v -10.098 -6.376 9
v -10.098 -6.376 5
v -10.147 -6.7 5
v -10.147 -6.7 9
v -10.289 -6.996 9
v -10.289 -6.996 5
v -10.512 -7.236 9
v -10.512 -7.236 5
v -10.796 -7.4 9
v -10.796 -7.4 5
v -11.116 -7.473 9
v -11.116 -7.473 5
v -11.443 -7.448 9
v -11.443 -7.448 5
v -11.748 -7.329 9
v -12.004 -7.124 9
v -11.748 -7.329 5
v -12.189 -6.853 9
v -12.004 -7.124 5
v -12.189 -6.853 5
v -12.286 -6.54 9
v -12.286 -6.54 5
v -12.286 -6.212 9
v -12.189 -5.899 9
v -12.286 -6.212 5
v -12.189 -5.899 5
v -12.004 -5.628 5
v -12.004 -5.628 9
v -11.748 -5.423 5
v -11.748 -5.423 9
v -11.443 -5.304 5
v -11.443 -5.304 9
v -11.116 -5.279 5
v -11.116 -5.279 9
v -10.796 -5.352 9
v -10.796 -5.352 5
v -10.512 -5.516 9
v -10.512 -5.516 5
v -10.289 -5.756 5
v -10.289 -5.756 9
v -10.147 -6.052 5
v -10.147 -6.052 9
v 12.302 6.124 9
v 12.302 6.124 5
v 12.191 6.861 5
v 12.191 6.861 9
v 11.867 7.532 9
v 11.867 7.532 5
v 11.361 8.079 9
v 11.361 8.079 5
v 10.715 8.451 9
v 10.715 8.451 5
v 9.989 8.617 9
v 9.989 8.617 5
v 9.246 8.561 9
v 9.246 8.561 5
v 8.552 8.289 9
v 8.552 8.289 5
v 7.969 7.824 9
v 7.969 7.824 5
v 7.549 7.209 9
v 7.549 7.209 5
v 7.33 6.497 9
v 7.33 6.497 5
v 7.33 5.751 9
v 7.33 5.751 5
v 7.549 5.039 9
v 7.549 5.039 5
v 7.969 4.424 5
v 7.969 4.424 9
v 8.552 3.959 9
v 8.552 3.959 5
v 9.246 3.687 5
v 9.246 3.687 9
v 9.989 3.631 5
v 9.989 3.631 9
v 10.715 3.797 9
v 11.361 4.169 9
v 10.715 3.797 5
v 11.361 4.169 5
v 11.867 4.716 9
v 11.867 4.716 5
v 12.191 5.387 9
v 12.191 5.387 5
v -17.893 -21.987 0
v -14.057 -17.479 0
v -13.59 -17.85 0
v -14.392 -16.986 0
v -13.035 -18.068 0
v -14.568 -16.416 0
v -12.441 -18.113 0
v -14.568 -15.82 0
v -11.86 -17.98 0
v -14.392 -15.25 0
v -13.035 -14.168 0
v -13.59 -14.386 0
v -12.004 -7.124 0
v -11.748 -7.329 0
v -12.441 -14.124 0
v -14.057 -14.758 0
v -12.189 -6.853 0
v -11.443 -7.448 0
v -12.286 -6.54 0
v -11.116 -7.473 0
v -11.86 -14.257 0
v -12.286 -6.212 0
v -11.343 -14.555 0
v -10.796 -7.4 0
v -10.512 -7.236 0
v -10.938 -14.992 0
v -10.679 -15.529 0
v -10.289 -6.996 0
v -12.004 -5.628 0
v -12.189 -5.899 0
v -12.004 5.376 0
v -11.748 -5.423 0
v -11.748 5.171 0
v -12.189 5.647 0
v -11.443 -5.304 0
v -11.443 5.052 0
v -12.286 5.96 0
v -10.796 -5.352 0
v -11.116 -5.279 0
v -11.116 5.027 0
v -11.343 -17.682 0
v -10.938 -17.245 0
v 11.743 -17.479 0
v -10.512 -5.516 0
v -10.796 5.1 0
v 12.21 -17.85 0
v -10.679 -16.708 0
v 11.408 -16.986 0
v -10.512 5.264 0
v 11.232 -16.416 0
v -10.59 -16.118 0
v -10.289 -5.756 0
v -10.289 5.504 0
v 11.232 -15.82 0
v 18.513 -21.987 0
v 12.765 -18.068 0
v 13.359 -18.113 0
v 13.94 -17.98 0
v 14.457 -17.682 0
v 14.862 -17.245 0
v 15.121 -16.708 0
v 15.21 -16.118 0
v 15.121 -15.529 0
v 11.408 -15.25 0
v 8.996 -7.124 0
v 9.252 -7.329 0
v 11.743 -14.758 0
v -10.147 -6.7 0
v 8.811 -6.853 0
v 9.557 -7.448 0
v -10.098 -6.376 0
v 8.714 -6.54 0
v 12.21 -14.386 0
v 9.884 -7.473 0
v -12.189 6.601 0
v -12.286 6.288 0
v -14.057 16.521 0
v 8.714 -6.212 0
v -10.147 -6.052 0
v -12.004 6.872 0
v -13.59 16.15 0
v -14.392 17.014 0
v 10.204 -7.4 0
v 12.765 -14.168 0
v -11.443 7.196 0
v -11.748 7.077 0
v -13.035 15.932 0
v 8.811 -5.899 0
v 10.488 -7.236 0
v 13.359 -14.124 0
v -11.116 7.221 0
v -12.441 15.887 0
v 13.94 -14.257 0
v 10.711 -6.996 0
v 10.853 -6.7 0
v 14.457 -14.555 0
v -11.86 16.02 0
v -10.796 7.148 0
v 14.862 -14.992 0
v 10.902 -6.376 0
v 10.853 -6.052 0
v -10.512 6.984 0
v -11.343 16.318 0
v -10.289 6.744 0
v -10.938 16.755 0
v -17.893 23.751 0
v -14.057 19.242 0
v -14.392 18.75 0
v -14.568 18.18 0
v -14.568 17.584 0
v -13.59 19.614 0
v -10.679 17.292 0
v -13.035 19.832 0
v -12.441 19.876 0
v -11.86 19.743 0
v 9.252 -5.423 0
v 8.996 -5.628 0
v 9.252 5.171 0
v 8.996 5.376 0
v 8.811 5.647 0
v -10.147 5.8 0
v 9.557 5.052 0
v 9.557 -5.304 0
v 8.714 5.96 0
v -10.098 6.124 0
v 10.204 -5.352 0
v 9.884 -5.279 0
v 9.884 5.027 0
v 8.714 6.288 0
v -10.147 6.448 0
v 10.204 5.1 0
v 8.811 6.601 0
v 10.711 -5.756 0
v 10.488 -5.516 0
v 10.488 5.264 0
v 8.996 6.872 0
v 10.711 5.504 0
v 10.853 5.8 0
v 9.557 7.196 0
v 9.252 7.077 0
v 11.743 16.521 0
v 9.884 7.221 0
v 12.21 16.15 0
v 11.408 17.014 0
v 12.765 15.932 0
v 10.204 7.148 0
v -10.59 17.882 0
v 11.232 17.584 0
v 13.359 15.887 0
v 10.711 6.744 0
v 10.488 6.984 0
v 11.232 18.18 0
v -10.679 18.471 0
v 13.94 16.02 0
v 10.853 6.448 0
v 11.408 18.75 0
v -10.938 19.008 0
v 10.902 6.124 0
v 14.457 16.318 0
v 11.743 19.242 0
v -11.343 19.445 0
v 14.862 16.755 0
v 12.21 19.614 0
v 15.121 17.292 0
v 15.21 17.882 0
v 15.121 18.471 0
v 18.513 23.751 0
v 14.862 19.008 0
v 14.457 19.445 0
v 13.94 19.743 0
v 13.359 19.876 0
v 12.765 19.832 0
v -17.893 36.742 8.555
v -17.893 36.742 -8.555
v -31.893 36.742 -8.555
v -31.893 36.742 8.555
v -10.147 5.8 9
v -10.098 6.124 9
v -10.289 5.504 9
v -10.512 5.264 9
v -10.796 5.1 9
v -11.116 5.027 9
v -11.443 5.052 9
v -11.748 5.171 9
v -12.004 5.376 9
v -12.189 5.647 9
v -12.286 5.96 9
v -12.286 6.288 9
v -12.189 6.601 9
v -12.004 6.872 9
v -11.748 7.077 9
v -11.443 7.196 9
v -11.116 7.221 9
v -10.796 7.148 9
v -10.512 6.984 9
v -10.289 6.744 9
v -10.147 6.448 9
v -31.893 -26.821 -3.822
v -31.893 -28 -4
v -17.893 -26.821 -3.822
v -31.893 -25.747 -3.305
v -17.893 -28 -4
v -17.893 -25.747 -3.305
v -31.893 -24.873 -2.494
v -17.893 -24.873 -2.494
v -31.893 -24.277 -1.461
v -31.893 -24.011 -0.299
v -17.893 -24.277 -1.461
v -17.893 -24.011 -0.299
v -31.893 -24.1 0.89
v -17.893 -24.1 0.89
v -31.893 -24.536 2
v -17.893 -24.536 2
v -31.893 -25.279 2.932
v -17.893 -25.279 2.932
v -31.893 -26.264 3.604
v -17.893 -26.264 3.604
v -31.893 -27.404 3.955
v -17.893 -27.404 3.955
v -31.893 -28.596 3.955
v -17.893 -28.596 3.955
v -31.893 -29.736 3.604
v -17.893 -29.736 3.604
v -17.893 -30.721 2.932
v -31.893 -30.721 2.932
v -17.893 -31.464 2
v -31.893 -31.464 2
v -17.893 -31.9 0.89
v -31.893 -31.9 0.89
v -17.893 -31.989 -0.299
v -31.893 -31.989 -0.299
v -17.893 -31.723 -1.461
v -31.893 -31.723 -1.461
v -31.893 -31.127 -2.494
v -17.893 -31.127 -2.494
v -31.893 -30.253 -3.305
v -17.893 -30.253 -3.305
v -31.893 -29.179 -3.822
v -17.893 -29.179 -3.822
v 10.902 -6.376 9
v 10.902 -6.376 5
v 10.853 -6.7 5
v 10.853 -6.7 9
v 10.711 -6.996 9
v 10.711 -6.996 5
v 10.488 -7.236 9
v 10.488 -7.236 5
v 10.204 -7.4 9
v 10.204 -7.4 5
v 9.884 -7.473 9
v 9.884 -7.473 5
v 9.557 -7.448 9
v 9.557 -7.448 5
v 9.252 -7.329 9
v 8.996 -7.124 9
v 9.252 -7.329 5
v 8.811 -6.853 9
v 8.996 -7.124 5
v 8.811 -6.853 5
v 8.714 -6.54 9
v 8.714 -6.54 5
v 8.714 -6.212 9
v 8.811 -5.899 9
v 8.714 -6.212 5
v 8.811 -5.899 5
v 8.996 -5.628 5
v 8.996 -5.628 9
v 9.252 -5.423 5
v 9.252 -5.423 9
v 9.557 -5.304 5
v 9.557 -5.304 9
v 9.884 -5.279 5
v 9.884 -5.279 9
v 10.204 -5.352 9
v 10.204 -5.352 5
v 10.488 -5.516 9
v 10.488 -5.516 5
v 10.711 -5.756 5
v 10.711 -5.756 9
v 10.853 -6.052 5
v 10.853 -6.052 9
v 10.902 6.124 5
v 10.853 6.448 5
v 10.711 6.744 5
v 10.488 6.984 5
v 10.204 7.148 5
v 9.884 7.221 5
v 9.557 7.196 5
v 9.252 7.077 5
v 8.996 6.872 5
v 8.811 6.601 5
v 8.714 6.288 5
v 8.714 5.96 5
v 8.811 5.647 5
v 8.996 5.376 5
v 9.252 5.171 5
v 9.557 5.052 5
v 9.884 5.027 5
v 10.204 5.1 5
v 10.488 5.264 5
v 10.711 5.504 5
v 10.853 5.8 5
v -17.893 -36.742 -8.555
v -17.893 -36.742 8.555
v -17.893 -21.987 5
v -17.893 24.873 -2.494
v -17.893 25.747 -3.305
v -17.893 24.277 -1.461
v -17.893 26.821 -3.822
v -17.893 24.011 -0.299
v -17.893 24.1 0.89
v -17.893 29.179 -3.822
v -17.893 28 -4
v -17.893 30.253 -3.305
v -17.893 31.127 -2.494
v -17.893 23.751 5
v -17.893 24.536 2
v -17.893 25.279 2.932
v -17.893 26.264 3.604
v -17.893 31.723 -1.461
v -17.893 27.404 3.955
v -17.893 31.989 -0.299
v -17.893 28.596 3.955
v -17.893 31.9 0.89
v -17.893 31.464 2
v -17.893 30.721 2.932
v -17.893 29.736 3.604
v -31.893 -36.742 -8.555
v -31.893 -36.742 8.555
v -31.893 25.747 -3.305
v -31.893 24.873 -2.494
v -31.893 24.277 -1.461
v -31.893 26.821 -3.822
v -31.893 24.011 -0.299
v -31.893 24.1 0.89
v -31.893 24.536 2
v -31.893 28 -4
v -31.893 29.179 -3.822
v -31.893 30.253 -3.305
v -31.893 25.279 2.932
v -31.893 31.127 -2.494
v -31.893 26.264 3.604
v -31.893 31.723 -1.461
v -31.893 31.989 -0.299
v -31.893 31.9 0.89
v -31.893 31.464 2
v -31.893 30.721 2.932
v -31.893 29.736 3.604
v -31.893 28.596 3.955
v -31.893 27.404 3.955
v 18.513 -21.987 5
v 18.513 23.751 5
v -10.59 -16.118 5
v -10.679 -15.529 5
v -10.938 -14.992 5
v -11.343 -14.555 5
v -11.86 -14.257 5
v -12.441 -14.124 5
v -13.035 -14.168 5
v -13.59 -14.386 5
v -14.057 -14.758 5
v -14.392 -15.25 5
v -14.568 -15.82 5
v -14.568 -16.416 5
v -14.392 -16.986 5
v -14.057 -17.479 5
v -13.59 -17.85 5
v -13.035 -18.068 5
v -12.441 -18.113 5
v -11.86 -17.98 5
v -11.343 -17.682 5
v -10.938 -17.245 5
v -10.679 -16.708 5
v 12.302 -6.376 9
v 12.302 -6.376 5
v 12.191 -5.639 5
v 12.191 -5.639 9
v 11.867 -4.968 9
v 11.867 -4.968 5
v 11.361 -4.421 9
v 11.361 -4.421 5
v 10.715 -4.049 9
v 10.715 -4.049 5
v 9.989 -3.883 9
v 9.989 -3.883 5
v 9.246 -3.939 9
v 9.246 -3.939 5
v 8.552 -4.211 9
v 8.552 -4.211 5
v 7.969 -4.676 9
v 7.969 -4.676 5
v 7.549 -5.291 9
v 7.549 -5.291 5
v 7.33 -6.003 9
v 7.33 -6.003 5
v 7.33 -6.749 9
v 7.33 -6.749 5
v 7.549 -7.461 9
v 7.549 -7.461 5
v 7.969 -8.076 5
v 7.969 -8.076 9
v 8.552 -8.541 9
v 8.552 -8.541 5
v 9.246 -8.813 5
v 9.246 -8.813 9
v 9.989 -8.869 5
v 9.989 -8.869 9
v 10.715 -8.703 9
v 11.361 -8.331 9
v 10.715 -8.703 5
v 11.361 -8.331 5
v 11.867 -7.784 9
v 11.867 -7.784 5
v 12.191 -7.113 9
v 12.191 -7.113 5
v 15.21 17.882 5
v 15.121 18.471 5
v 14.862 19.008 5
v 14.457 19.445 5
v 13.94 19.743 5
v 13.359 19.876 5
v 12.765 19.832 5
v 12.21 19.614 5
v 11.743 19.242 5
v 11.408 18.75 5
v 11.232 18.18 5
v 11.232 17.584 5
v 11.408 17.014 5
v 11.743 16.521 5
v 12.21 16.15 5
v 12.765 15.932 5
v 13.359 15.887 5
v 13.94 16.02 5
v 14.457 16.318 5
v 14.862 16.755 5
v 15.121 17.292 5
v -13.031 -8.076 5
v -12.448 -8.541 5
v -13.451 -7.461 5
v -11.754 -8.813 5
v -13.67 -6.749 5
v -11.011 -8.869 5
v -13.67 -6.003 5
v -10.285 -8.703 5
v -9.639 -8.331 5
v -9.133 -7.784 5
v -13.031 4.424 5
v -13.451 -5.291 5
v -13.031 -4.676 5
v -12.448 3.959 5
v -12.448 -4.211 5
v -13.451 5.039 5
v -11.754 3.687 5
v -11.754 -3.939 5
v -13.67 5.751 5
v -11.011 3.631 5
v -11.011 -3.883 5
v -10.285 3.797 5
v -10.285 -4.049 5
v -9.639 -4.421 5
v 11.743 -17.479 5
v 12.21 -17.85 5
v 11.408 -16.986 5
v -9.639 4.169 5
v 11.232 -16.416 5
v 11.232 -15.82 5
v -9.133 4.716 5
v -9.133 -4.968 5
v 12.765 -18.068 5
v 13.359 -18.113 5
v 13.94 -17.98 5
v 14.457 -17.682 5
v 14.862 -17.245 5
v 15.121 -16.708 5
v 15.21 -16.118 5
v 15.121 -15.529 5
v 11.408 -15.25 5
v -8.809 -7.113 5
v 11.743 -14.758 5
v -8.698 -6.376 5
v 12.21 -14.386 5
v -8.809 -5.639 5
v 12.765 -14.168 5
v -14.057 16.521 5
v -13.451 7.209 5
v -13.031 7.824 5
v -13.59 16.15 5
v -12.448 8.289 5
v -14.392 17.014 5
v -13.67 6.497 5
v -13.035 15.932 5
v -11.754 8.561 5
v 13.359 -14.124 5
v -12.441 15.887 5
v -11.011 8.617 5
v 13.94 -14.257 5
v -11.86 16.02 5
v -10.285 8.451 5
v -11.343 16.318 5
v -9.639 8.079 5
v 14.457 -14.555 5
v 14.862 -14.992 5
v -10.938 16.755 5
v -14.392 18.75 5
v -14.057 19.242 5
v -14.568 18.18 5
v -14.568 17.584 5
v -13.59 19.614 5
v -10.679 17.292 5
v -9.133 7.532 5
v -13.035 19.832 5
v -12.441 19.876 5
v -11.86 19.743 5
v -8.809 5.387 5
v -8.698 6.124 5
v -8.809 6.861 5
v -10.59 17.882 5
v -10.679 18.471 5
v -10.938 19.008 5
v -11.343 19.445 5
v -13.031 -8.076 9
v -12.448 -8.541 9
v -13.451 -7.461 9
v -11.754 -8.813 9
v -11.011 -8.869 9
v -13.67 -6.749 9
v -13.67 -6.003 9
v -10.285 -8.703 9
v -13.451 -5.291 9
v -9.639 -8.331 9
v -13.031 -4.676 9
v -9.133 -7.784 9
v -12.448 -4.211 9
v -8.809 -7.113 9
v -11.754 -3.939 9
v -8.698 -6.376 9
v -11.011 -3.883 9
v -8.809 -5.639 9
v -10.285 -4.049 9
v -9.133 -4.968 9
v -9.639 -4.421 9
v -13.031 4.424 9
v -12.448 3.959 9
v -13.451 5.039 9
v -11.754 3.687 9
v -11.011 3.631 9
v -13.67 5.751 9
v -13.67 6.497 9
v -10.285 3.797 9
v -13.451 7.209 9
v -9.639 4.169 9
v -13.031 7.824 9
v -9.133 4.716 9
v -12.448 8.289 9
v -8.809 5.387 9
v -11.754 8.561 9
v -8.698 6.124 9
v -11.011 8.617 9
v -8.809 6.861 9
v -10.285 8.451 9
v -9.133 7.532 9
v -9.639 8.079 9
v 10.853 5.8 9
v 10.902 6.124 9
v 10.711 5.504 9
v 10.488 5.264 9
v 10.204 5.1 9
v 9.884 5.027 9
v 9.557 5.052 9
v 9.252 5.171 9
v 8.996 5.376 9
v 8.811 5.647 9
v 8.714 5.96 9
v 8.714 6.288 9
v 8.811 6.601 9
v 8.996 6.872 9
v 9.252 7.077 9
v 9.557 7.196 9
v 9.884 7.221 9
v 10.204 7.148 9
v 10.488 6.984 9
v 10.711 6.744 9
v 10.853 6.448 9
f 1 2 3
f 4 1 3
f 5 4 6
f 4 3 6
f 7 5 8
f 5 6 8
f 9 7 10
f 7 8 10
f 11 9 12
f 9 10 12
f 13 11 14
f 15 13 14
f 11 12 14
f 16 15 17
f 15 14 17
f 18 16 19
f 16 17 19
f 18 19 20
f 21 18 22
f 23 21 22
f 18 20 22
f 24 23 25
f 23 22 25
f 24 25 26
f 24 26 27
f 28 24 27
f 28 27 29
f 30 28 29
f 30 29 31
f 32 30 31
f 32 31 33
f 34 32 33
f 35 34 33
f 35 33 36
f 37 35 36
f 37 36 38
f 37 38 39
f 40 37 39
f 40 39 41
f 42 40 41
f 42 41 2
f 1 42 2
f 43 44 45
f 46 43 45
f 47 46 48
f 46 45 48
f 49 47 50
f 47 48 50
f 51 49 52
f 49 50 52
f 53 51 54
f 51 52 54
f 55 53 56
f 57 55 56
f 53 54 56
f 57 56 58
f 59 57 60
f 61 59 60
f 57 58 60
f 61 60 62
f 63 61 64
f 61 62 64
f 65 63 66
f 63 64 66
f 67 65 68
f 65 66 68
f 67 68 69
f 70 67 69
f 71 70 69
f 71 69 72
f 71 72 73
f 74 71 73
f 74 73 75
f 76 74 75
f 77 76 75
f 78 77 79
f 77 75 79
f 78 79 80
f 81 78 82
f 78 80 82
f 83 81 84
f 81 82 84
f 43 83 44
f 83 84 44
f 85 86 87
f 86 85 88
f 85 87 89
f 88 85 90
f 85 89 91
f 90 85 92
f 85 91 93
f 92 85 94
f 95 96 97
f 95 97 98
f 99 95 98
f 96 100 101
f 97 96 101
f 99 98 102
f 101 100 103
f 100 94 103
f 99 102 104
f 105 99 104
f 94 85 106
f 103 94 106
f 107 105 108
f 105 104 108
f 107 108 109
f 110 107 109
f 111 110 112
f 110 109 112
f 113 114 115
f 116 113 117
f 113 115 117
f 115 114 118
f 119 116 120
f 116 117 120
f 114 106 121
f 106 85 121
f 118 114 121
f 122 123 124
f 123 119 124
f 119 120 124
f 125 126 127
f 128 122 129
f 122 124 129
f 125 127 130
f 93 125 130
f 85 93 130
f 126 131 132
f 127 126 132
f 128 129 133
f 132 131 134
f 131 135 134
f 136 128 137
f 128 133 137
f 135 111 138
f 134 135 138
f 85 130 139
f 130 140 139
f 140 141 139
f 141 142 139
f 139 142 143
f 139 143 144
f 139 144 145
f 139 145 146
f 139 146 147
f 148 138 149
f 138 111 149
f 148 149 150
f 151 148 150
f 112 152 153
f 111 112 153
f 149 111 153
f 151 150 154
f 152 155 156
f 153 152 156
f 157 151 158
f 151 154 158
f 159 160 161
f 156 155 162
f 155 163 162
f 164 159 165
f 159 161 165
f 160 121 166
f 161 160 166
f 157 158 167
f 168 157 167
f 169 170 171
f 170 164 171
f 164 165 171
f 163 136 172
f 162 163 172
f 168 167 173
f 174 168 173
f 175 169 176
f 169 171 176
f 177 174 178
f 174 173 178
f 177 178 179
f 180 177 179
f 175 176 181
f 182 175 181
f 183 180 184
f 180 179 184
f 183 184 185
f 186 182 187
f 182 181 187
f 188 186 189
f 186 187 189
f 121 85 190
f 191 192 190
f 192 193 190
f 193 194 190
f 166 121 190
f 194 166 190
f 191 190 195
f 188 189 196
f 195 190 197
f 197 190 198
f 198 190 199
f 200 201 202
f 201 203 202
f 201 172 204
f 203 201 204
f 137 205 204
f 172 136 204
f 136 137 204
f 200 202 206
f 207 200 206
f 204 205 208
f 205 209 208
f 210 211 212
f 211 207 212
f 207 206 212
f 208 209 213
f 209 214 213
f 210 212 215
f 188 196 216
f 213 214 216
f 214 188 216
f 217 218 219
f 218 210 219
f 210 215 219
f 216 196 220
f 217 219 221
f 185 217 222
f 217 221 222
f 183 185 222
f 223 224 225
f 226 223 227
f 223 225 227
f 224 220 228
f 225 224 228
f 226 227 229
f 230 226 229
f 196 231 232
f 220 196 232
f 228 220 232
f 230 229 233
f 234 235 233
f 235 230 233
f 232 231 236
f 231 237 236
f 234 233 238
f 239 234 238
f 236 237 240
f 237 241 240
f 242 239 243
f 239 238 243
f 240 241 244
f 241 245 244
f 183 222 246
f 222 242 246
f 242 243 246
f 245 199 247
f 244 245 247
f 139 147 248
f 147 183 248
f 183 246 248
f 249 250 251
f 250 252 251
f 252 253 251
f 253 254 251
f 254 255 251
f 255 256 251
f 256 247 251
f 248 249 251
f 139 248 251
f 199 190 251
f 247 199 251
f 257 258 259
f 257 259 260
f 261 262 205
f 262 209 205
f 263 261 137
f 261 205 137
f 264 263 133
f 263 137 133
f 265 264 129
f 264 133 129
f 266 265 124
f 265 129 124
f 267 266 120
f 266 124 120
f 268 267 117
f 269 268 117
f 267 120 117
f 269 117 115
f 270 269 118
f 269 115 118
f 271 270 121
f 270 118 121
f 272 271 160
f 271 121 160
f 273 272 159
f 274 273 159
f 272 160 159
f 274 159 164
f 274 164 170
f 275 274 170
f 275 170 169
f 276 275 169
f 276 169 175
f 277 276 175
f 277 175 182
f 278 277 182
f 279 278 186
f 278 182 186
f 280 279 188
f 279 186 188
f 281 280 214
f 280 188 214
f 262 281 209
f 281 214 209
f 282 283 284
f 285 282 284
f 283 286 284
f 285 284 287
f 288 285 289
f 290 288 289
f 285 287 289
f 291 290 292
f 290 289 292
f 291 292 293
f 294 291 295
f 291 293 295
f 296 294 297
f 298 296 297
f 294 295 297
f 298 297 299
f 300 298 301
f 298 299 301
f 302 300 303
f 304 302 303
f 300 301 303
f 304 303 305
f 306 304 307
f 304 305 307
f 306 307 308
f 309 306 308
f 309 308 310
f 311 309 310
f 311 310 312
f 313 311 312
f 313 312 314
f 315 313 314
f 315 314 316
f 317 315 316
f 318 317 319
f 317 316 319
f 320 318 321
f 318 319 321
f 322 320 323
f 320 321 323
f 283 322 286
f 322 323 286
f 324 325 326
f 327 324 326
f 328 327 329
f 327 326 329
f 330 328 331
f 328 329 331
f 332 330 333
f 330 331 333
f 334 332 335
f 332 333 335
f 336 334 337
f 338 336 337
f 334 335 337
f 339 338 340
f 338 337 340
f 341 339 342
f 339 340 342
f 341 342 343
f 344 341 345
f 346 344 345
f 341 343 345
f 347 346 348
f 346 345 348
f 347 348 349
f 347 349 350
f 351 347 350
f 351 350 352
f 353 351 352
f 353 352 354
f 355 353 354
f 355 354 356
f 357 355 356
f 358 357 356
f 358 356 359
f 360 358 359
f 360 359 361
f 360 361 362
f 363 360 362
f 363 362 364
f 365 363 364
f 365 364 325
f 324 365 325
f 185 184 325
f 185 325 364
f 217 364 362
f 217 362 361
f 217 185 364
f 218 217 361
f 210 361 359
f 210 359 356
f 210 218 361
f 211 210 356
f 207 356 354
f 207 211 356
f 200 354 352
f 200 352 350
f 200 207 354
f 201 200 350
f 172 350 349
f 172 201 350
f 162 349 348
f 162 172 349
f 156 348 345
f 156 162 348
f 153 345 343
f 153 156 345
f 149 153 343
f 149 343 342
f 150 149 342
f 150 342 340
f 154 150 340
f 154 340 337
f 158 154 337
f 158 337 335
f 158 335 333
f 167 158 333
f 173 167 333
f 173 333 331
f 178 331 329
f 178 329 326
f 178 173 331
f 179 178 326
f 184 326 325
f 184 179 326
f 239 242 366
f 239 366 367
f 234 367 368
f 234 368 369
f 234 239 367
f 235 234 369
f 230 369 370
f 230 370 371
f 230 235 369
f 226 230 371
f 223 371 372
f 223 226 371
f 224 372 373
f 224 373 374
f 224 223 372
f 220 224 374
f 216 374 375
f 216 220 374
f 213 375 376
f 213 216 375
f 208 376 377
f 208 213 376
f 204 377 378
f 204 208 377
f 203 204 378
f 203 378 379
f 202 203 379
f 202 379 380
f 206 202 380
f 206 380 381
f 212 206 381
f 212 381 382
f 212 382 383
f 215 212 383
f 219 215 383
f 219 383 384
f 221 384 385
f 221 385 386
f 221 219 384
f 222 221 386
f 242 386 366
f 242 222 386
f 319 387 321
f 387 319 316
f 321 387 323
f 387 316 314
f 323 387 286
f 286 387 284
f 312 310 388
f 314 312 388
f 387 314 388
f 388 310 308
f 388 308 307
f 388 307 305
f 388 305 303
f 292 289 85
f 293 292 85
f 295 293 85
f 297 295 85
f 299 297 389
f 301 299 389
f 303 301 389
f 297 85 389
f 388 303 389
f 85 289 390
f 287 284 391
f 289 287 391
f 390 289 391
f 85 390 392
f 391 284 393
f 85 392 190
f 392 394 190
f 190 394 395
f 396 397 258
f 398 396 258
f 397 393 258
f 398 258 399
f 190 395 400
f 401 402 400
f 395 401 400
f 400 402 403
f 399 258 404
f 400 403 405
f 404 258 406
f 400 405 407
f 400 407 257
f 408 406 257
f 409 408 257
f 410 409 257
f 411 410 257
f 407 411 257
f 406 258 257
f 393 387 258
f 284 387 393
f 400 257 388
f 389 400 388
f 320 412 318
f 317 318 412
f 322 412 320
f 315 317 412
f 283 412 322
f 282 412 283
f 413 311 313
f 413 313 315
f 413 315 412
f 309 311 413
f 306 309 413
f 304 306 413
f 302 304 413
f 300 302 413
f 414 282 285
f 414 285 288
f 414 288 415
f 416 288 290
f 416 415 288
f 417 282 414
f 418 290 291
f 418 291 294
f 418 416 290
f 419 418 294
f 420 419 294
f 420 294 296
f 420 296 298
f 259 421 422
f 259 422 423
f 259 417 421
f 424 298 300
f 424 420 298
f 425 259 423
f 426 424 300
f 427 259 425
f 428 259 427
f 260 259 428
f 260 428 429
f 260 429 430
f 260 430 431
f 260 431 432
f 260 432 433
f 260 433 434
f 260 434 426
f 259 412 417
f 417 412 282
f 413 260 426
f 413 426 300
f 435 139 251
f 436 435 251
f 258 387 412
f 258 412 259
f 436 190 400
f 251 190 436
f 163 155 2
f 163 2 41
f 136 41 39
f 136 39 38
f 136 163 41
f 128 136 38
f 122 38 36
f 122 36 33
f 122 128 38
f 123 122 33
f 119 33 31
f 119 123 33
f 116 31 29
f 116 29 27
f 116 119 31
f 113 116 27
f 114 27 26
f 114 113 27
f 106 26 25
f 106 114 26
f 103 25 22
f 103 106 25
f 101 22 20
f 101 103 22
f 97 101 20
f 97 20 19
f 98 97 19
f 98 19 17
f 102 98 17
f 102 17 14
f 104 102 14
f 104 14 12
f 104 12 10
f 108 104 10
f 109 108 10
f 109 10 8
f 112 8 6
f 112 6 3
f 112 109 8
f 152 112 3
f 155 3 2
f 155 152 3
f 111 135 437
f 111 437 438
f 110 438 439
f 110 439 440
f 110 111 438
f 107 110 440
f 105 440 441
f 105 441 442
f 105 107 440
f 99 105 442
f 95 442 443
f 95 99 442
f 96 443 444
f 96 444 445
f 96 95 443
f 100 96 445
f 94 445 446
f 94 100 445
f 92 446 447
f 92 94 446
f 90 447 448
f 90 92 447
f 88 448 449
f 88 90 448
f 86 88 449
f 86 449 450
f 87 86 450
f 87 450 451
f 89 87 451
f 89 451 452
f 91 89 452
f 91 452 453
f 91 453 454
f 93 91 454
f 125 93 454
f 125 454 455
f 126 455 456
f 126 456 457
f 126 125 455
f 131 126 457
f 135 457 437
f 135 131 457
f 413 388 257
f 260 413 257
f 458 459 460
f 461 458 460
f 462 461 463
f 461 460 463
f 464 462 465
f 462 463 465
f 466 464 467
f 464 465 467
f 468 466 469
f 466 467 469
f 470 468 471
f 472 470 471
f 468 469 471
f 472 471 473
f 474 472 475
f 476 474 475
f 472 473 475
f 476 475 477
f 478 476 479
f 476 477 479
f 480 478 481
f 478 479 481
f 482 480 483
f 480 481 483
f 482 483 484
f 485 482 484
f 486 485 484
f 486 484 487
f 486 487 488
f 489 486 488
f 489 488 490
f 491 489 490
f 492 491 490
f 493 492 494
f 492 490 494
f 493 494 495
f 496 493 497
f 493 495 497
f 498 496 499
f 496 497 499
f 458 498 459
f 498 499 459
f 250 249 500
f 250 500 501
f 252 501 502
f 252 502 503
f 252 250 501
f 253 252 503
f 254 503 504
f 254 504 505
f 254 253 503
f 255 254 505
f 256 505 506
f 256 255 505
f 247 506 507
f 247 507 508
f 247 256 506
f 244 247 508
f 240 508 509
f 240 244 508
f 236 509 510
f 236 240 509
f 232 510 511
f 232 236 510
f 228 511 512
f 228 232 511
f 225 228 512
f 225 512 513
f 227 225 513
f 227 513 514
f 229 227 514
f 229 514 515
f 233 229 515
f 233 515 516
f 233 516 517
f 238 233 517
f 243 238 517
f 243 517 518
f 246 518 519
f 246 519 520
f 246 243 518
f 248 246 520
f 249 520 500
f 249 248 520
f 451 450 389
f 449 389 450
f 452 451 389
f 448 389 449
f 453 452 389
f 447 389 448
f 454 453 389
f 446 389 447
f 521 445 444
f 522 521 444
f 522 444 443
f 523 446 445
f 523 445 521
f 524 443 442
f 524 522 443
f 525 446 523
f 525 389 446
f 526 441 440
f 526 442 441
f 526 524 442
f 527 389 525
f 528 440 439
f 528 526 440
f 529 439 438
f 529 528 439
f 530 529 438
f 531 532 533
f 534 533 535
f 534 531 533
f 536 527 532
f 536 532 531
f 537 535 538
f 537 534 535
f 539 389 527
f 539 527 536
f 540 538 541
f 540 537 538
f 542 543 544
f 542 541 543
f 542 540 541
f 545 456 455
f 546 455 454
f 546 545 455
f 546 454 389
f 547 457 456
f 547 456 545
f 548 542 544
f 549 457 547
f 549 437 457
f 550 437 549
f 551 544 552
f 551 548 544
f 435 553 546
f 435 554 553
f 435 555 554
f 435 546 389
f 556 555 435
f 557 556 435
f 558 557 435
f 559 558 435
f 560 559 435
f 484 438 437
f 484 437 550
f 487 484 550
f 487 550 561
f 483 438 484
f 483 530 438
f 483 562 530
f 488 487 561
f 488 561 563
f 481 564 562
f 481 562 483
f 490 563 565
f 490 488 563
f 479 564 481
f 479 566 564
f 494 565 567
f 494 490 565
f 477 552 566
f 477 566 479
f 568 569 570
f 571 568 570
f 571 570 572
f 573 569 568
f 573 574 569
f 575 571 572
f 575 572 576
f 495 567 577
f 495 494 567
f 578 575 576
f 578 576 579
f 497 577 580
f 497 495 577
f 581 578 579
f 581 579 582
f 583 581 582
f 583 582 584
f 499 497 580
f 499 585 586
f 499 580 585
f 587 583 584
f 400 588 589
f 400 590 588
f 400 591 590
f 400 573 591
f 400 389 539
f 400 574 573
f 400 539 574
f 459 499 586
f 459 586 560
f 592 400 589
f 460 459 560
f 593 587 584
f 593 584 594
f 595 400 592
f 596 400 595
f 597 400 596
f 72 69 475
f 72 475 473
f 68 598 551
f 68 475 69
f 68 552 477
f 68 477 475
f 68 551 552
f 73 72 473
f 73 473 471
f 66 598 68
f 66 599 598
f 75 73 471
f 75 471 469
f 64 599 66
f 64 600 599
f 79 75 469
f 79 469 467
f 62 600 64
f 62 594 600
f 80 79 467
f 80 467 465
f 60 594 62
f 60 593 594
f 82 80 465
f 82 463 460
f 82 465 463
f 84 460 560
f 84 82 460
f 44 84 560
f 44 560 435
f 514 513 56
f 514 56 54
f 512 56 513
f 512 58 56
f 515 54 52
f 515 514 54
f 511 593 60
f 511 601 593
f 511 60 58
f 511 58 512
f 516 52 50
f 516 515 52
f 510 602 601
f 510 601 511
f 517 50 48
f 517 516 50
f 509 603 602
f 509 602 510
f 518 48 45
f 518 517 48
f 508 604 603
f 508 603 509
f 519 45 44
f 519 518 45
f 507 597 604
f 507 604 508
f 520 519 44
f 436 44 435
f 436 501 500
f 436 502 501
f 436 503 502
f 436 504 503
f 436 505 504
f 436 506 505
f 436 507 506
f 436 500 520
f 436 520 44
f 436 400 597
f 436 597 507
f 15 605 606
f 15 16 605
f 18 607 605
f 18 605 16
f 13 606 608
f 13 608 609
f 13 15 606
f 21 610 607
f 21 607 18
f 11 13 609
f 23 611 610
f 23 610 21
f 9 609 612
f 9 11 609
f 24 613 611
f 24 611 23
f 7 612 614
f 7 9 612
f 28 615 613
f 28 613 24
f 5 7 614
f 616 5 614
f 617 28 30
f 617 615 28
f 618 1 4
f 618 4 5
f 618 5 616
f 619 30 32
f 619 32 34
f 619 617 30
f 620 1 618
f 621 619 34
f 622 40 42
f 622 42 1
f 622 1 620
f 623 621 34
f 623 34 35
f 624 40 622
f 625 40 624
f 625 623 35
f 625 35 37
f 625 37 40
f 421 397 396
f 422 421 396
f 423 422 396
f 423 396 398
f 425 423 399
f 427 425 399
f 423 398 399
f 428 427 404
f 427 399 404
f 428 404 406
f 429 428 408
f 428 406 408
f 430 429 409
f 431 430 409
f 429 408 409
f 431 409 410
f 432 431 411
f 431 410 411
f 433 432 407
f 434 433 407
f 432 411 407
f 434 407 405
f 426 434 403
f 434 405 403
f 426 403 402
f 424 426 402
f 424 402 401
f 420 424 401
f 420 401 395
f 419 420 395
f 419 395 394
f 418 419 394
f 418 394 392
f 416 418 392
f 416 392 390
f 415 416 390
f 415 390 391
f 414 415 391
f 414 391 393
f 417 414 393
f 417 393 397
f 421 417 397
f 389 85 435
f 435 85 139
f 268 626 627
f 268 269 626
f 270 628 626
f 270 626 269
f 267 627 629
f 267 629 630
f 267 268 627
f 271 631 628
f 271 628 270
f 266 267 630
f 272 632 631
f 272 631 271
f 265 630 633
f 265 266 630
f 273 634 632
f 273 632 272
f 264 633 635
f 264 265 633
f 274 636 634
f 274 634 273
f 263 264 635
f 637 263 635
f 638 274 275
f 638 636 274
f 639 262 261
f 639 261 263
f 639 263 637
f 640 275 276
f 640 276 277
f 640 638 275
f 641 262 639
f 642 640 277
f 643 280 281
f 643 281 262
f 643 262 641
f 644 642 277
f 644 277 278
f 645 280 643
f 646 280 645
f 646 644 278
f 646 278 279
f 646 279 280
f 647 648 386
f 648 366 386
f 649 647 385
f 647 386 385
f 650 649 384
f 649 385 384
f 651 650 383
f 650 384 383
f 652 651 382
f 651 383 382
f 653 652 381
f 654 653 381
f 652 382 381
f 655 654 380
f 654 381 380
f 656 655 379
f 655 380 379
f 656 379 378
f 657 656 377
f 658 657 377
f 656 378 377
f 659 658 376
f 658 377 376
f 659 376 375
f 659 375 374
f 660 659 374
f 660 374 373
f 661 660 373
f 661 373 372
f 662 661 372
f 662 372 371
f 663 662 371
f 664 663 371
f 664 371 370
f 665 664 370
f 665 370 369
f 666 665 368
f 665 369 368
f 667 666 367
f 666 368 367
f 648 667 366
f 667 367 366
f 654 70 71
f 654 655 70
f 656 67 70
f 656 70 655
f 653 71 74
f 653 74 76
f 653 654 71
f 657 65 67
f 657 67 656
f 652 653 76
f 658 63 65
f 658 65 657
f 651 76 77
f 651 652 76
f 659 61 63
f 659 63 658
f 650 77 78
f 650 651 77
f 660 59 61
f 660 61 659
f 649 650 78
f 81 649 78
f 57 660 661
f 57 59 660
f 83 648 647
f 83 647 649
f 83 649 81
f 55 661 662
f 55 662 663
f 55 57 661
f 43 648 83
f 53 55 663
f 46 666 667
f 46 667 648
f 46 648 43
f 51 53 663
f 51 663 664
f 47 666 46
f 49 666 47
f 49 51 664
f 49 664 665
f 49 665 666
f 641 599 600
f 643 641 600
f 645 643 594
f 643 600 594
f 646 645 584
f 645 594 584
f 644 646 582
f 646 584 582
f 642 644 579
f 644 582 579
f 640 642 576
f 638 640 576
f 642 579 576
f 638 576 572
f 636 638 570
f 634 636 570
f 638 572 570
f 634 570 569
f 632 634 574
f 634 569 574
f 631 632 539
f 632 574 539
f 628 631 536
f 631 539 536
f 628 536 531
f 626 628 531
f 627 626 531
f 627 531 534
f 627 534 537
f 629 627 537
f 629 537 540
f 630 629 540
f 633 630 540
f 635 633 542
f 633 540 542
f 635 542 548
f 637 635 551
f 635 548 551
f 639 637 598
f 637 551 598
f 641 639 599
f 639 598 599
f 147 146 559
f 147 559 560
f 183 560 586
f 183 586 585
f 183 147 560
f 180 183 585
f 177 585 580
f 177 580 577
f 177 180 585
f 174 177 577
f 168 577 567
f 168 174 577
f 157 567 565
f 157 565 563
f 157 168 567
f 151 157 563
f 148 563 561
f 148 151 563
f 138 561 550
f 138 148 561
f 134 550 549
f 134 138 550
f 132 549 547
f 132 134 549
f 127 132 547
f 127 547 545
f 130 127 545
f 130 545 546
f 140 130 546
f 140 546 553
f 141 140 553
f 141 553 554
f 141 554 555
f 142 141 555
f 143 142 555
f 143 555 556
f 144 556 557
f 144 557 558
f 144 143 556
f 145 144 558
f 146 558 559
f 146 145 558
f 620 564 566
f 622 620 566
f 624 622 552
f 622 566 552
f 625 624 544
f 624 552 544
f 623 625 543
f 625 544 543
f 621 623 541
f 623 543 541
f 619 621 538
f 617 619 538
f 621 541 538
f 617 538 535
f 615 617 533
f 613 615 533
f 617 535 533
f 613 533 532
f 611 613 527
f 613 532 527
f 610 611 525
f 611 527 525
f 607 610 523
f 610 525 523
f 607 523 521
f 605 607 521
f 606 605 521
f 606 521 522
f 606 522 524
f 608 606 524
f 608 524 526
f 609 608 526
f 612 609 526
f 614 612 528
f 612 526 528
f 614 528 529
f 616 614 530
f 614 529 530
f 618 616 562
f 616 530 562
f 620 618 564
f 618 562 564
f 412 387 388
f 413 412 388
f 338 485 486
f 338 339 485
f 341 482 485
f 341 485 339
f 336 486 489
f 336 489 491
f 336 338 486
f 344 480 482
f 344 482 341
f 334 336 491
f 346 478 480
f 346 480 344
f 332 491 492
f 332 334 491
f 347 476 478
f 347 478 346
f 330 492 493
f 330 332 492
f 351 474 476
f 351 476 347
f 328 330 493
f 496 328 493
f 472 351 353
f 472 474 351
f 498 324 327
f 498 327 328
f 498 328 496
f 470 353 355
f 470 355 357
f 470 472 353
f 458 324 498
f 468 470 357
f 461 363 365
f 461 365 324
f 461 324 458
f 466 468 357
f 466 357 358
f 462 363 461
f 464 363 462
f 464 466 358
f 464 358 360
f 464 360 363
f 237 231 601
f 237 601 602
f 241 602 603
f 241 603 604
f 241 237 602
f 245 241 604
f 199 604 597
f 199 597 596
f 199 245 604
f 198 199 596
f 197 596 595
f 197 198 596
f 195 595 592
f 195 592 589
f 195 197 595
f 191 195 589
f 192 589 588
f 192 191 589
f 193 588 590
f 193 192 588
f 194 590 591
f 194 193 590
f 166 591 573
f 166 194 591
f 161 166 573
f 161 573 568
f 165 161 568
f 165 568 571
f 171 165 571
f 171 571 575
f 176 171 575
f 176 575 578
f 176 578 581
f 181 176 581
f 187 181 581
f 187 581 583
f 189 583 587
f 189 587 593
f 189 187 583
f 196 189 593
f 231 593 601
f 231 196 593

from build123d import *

# Parameters (mm, degrees)
IZIM1_W                     = 36.405816339
IZIM1_H                     = 45.737890708
IZIM1_R                     = 2
IZIM1_R_2                   = 2.5
IZIM1_R_3                   = 1.1
Y_KSEKLIK_EKSTR_ZYON3_DEPTH = 5
IZIM2_R                     = 2.5
Y_KSEKLIK_EKSTR_ZYON4_DEPTH = 4
IZIM3_R                     = 1.1
KES_EKSTR_ZYON1_DEPTH       = 17
IZIM5_W                     = 17.110844688
IZIM5_H                     = 73.483837376
Y_KSEKLIK_EKSTR_ZYON6_DEPTH = 14
IZIM6_R                     = 4
KES_EKSTR_ZYON2_DEPTH       = 31


with BuildPart() as part:
    # Çizim1 → Yükseklik-Ekstrüzyon3 (new body)
    # profile 1 of 5: a face of its own
    with BuildSketch(Plane.XY):
        with Locations((0.30959843, 0.881738623)):
            Rectangle(IZIM1_W, IZIM1_H)
        with Locations((-12.59040157, -16.118261377)):
            Circle(IZIM1_R, mode=Mode.SUBTRACT)
        with Locations((13.20959843, -16.118261377)):
            Circle(IZIM1_R, mode=Mode.SUBTRACT)
        with Locations((13.20959843, 17.881738623)):
            Circle(IZIM1_R, mode=Mode.SUBTRACT)
        with Locations((-12.59040157, 17.881738623)):
            Circle(IZIM1_R, mode=Mode.SUBTRACT)
        with Locations((-11.198102854, -6.37596266)):
            Circle(IZIM1_R_2, mode=Mode.SUBTRACT)
        with Locations((9.801897146, -6.37596266)):
            Circle(IZIM1_R_2, mode=Mode.SUBTRACT)
        with Locations((9.801897146, 6.12403734)):
            Circle(IZIM1_R_2, mode=Mode.SUBTRACT)
        with Locations((-11.198102854, 6.12403734)):
            Circle(IZIM1_R_2, mode=Mode.SUBTRACT)
    # profile 2 of 5: a face of its own
    with BuildSketch(Plane.XY):
        with Locations((9.801897146, -6.37596266)):
            Circle(IZIM1_R_2)
        with Locations((9.801897146, -6.37596266)):
            Circle(IZIM1_R_3, mode=Mode.SUBTRACT)
    # profile 3 of 5: a face of its own
    with BuildSketch(Plane.XY):
        with Locations((9.801897146, 6.12403734)):
            Circle(IZIM1_R_2)
        with Locations((9.801897146, 6.12403734)):
            Circle(IZIM1_R_3, mode=Mode.SUBTRACT)
    # profile 4 of 5: a face of its own
    with BuildSketch(Plane.XY):
        with Locations((-11.198102854, 6.12403734)):
            Circle(IZIM1_R_2)
        with Locations((-11.198102854, 6.12403734)):
            Circle(IZIM1_R_3, mode=Mode.SUBTRACT)
    # profile 5 of 5: a face of its own
    with BuildSketch(Plane.XY):
        with Locations((-11.198102854, -6.37596266)):
            Circle(IZIM1_R_2)
        with Locations((-11.198102854, -6.37596266)):
            Circle(IZIM1_R_3, mode=Mode.SUBTRACT)
    extrude(amount=Y_KSEKLIK_EKSTR_ZYON3_DEPTH)

    # Çizim2 → Yükseklik-Ekstrüzyon4 (add)
    with BuildSketch(Plane.XY.offset(5)):
        with Locations((-11.198102854, 6.12403734)):
            Circle(IZIM2_R)
        with Locations((-11.198102854, -6.37596266)):
            Circle(IZIM2_R)
        with Locations((9.801897146, -6.37596266)):
            Circle(IZIM2_R)
        with Locations((9.801897146, 6.12403734)):
            Circle(IZIM2_R)
    extrude(amount=Y_KSEKLIK_EKSTR_ZYON4_DEPTH)

    # Çizim3 → Kes-Ekstrüzyon1 (cut, symmetric)
    with BuildSketch(Plane(origin=(0, 0, 5), x_dir=(-1, 0, 0), z_dir=(0, 0, -1))):
        with Locations(Location((11.198102854, 6.12403734, 0), (0, 0, 180))):
            Circle(IZIM3_R)
        with Locations(Location((11.198102854, -6.37596266, 0), (0, 0, 180))):
            Circle(IZIM3_R)
        with Locations(Location((-9.801897146, -6.37596266, 0), (0, 0, 180))):
            Circle(IZIM3_R)
        with Locations(Location((-9.801897146, 6.12403734, 0), (0, 0, 180))):
            Circle(IZIM3_R)
    extrude(amount=KES_EKSTR_ZYON1_DEPTH, both=True, mode=Mode.SUBTRACT)

    # Çizim5 → Yükseklik-Ekstrüzyon6 (add)
    with BuildSketch(Plane.ZY.offset(17.89330974)):
        Rectangle(IZIM5_W, IZIM5_H)
    extrude(amount=Y_KSEKLIK_EKSTR_ZYON6_DEPTH)

    # Çizim6 → Kes-Ekstrüzyon2 (cut, symmetric)
    with BuildSketch(Plane(origin=(-17.89330974, 0, 0), x_dir=(0, 0, -1), z_dir=(1, 0, 0))):
        with Locations((0, 28)):
            Circle(IZIM6_R)
        with Locations((0, -28)):
            Circle(IZIM6_R)
    extrude(amount=KES_EKSTR_ZYON2_DEPTH, both=True, mode=Mode.SUBTRACT)


solid = part.part
